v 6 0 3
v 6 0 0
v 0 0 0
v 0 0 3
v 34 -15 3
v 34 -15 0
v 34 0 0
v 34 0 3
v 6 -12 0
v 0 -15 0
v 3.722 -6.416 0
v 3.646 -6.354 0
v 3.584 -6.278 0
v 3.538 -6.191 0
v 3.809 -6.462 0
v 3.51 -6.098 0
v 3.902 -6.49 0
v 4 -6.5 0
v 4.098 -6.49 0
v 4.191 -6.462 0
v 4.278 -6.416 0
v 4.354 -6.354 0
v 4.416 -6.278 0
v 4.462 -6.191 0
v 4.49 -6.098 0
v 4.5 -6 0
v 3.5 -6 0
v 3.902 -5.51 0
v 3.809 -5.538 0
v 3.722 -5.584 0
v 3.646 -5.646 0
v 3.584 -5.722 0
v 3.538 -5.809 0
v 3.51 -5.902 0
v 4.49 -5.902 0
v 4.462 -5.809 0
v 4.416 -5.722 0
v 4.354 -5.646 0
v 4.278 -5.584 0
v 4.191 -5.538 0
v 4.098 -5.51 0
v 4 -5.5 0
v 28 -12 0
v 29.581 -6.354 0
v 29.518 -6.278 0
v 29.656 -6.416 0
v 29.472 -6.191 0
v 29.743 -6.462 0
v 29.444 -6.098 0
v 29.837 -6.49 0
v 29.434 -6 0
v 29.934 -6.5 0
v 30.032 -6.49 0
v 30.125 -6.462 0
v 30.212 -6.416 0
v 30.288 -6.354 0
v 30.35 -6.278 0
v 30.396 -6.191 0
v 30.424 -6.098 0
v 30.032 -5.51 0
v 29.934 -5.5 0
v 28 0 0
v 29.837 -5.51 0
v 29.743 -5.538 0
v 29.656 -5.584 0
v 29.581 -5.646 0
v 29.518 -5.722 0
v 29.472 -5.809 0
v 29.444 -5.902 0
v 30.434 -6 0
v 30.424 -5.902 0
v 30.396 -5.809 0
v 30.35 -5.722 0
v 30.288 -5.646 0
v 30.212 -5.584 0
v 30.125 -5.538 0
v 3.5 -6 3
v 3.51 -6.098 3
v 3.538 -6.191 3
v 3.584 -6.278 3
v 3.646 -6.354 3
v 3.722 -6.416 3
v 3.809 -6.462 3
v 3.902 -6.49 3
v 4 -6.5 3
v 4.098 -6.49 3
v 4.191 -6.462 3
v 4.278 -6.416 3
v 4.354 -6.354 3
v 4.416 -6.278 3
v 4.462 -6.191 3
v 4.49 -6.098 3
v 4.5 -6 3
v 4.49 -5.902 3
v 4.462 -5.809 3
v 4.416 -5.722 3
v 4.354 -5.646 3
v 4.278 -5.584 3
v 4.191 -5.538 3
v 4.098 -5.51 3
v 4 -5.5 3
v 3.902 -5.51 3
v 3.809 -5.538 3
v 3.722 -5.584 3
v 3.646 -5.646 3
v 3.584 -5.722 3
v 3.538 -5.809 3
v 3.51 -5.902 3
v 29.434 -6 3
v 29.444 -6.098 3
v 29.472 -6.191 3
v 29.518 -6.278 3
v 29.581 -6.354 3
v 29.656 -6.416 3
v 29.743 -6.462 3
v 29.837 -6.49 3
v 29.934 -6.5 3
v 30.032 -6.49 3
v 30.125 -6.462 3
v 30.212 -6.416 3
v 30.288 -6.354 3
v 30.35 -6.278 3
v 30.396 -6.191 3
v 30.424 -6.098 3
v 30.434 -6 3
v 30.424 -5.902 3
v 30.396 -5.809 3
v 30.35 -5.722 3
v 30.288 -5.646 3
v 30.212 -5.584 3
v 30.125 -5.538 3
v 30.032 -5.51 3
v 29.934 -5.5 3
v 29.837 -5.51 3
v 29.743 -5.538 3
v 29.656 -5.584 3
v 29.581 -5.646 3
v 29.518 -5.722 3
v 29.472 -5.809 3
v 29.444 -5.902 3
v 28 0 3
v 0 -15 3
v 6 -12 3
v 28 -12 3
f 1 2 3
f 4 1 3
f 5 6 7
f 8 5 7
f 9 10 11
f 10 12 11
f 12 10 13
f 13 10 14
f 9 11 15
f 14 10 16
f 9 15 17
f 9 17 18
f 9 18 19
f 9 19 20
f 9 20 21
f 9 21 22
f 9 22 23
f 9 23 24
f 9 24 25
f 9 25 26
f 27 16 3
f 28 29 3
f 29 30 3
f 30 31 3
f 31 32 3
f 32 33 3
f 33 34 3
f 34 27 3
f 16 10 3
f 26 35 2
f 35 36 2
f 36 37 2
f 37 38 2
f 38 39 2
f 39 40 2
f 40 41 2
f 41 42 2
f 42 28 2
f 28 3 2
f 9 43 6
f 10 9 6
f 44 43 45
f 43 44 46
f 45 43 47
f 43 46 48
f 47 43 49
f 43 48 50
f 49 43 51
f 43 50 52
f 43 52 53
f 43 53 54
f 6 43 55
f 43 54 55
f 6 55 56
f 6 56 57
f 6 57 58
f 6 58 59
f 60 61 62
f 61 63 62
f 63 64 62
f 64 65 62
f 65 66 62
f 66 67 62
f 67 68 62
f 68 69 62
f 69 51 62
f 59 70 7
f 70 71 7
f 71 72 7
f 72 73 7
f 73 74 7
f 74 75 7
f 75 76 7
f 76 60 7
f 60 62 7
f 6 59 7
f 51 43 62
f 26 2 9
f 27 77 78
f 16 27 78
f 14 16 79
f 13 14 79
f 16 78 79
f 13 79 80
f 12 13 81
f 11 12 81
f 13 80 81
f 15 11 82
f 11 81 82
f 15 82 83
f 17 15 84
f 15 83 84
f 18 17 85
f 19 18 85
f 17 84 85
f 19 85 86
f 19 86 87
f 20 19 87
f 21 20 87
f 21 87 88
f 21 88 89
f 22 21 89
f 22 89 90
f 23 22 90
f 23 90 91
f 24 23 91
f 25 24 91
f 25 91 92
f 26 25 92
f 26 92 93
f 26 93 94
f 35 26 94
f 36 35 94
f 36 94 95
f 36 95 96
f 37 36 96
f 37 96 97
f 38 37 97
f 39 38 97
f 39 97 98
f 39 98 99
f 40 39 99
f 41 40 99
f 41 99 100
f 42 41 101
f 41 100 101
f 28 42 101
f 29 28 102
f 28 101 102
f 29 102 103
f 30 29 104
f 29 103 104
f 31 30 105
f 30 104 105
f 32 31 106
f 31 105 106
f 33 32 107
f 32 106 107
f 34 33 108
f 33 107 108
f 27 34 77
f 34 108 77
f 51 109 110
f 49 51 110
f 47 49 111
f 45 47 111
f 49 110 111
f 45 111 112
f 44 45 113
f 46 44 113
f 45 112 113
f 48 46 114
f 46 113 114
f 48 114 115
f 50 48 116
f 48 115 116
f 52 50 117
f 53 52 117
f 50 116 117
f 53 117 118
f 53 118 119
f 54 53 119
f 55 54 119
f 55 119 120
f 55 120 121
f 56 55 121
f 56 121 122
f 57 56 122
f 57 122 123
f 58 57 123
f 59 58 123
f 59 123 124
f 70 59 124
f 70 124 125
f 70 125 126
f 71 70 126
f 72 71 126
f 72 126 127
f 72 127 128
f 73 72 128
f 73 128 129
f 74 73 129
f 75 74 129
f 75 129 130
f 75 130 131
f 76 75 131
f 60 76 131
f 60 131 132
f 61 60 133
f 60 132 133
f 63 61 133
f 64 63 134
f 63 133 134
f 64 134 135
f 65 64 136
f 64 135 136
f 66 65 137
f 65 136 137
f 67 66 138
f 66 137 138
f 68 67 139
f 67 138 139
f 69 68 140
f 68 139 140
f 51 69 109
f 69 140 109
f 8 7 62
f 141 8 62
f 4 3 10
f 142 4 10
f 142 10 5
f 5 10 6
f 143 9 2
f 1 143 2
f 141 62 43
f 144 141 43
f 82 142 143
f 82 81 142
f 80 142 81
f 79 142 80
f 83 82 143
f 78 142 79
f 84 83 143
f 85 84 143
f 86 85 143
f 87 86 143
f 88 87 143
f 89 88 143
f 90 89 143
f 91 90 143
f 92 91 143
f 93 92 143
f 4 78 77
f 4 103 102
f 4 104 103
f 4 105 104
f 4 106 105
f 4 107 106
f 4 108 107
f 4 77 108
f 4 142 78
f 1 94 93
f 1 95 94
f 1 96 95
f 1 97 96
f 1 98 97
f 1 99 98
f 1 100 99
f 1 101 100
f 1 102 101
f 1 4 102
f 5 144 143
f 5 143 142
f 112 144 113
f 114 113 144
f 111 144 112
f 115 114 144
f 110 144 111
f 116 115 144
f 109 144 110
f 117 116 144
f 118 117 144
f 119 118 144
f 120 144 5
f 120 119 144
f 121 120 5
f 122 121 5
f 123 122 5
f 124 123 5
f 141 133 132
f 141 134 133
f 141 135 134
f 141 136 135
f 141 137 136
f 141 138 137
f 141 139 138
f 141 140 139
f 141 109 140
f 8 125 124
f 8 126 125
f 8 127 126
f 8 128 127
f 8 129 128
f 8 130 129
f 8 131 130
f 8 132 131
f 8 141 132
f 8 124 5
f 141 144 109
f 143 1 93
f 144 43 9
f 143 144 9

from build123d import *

# Parameters (mm, degrees)
F1_DEPTH = 3
F3_D     = 1
F5_D     = 1


with BuildPart() as f1:
    # F0 (on Top) → F1 (new body)
    with BuildSketch(Plane.XY):
        Polygon((6, 0), (0, 0), (0, -15), (34, -15), (34, 0), (28, 0), (28, -12), (6, -12), align=None)
    extrude(amount=F1_DEPTH)

    # F3 (through all)
    with Locations(Plane(origin=(0, 0, 0), x_dir=(1, 0, 0), z_dir=(0, 0, -1))):
        with Locations((4, 6)):
            Hole(F3_D / 2)

    # F5 (through all)
    with Locations(Plane(origin=(0, 0, 0), x_dir=(1, 0, 0), z_dir=(0, 0, -1))):
        with Locations((29.9340598285, 6)):
            Hole(F5_D / 2)


solid = f1.part
